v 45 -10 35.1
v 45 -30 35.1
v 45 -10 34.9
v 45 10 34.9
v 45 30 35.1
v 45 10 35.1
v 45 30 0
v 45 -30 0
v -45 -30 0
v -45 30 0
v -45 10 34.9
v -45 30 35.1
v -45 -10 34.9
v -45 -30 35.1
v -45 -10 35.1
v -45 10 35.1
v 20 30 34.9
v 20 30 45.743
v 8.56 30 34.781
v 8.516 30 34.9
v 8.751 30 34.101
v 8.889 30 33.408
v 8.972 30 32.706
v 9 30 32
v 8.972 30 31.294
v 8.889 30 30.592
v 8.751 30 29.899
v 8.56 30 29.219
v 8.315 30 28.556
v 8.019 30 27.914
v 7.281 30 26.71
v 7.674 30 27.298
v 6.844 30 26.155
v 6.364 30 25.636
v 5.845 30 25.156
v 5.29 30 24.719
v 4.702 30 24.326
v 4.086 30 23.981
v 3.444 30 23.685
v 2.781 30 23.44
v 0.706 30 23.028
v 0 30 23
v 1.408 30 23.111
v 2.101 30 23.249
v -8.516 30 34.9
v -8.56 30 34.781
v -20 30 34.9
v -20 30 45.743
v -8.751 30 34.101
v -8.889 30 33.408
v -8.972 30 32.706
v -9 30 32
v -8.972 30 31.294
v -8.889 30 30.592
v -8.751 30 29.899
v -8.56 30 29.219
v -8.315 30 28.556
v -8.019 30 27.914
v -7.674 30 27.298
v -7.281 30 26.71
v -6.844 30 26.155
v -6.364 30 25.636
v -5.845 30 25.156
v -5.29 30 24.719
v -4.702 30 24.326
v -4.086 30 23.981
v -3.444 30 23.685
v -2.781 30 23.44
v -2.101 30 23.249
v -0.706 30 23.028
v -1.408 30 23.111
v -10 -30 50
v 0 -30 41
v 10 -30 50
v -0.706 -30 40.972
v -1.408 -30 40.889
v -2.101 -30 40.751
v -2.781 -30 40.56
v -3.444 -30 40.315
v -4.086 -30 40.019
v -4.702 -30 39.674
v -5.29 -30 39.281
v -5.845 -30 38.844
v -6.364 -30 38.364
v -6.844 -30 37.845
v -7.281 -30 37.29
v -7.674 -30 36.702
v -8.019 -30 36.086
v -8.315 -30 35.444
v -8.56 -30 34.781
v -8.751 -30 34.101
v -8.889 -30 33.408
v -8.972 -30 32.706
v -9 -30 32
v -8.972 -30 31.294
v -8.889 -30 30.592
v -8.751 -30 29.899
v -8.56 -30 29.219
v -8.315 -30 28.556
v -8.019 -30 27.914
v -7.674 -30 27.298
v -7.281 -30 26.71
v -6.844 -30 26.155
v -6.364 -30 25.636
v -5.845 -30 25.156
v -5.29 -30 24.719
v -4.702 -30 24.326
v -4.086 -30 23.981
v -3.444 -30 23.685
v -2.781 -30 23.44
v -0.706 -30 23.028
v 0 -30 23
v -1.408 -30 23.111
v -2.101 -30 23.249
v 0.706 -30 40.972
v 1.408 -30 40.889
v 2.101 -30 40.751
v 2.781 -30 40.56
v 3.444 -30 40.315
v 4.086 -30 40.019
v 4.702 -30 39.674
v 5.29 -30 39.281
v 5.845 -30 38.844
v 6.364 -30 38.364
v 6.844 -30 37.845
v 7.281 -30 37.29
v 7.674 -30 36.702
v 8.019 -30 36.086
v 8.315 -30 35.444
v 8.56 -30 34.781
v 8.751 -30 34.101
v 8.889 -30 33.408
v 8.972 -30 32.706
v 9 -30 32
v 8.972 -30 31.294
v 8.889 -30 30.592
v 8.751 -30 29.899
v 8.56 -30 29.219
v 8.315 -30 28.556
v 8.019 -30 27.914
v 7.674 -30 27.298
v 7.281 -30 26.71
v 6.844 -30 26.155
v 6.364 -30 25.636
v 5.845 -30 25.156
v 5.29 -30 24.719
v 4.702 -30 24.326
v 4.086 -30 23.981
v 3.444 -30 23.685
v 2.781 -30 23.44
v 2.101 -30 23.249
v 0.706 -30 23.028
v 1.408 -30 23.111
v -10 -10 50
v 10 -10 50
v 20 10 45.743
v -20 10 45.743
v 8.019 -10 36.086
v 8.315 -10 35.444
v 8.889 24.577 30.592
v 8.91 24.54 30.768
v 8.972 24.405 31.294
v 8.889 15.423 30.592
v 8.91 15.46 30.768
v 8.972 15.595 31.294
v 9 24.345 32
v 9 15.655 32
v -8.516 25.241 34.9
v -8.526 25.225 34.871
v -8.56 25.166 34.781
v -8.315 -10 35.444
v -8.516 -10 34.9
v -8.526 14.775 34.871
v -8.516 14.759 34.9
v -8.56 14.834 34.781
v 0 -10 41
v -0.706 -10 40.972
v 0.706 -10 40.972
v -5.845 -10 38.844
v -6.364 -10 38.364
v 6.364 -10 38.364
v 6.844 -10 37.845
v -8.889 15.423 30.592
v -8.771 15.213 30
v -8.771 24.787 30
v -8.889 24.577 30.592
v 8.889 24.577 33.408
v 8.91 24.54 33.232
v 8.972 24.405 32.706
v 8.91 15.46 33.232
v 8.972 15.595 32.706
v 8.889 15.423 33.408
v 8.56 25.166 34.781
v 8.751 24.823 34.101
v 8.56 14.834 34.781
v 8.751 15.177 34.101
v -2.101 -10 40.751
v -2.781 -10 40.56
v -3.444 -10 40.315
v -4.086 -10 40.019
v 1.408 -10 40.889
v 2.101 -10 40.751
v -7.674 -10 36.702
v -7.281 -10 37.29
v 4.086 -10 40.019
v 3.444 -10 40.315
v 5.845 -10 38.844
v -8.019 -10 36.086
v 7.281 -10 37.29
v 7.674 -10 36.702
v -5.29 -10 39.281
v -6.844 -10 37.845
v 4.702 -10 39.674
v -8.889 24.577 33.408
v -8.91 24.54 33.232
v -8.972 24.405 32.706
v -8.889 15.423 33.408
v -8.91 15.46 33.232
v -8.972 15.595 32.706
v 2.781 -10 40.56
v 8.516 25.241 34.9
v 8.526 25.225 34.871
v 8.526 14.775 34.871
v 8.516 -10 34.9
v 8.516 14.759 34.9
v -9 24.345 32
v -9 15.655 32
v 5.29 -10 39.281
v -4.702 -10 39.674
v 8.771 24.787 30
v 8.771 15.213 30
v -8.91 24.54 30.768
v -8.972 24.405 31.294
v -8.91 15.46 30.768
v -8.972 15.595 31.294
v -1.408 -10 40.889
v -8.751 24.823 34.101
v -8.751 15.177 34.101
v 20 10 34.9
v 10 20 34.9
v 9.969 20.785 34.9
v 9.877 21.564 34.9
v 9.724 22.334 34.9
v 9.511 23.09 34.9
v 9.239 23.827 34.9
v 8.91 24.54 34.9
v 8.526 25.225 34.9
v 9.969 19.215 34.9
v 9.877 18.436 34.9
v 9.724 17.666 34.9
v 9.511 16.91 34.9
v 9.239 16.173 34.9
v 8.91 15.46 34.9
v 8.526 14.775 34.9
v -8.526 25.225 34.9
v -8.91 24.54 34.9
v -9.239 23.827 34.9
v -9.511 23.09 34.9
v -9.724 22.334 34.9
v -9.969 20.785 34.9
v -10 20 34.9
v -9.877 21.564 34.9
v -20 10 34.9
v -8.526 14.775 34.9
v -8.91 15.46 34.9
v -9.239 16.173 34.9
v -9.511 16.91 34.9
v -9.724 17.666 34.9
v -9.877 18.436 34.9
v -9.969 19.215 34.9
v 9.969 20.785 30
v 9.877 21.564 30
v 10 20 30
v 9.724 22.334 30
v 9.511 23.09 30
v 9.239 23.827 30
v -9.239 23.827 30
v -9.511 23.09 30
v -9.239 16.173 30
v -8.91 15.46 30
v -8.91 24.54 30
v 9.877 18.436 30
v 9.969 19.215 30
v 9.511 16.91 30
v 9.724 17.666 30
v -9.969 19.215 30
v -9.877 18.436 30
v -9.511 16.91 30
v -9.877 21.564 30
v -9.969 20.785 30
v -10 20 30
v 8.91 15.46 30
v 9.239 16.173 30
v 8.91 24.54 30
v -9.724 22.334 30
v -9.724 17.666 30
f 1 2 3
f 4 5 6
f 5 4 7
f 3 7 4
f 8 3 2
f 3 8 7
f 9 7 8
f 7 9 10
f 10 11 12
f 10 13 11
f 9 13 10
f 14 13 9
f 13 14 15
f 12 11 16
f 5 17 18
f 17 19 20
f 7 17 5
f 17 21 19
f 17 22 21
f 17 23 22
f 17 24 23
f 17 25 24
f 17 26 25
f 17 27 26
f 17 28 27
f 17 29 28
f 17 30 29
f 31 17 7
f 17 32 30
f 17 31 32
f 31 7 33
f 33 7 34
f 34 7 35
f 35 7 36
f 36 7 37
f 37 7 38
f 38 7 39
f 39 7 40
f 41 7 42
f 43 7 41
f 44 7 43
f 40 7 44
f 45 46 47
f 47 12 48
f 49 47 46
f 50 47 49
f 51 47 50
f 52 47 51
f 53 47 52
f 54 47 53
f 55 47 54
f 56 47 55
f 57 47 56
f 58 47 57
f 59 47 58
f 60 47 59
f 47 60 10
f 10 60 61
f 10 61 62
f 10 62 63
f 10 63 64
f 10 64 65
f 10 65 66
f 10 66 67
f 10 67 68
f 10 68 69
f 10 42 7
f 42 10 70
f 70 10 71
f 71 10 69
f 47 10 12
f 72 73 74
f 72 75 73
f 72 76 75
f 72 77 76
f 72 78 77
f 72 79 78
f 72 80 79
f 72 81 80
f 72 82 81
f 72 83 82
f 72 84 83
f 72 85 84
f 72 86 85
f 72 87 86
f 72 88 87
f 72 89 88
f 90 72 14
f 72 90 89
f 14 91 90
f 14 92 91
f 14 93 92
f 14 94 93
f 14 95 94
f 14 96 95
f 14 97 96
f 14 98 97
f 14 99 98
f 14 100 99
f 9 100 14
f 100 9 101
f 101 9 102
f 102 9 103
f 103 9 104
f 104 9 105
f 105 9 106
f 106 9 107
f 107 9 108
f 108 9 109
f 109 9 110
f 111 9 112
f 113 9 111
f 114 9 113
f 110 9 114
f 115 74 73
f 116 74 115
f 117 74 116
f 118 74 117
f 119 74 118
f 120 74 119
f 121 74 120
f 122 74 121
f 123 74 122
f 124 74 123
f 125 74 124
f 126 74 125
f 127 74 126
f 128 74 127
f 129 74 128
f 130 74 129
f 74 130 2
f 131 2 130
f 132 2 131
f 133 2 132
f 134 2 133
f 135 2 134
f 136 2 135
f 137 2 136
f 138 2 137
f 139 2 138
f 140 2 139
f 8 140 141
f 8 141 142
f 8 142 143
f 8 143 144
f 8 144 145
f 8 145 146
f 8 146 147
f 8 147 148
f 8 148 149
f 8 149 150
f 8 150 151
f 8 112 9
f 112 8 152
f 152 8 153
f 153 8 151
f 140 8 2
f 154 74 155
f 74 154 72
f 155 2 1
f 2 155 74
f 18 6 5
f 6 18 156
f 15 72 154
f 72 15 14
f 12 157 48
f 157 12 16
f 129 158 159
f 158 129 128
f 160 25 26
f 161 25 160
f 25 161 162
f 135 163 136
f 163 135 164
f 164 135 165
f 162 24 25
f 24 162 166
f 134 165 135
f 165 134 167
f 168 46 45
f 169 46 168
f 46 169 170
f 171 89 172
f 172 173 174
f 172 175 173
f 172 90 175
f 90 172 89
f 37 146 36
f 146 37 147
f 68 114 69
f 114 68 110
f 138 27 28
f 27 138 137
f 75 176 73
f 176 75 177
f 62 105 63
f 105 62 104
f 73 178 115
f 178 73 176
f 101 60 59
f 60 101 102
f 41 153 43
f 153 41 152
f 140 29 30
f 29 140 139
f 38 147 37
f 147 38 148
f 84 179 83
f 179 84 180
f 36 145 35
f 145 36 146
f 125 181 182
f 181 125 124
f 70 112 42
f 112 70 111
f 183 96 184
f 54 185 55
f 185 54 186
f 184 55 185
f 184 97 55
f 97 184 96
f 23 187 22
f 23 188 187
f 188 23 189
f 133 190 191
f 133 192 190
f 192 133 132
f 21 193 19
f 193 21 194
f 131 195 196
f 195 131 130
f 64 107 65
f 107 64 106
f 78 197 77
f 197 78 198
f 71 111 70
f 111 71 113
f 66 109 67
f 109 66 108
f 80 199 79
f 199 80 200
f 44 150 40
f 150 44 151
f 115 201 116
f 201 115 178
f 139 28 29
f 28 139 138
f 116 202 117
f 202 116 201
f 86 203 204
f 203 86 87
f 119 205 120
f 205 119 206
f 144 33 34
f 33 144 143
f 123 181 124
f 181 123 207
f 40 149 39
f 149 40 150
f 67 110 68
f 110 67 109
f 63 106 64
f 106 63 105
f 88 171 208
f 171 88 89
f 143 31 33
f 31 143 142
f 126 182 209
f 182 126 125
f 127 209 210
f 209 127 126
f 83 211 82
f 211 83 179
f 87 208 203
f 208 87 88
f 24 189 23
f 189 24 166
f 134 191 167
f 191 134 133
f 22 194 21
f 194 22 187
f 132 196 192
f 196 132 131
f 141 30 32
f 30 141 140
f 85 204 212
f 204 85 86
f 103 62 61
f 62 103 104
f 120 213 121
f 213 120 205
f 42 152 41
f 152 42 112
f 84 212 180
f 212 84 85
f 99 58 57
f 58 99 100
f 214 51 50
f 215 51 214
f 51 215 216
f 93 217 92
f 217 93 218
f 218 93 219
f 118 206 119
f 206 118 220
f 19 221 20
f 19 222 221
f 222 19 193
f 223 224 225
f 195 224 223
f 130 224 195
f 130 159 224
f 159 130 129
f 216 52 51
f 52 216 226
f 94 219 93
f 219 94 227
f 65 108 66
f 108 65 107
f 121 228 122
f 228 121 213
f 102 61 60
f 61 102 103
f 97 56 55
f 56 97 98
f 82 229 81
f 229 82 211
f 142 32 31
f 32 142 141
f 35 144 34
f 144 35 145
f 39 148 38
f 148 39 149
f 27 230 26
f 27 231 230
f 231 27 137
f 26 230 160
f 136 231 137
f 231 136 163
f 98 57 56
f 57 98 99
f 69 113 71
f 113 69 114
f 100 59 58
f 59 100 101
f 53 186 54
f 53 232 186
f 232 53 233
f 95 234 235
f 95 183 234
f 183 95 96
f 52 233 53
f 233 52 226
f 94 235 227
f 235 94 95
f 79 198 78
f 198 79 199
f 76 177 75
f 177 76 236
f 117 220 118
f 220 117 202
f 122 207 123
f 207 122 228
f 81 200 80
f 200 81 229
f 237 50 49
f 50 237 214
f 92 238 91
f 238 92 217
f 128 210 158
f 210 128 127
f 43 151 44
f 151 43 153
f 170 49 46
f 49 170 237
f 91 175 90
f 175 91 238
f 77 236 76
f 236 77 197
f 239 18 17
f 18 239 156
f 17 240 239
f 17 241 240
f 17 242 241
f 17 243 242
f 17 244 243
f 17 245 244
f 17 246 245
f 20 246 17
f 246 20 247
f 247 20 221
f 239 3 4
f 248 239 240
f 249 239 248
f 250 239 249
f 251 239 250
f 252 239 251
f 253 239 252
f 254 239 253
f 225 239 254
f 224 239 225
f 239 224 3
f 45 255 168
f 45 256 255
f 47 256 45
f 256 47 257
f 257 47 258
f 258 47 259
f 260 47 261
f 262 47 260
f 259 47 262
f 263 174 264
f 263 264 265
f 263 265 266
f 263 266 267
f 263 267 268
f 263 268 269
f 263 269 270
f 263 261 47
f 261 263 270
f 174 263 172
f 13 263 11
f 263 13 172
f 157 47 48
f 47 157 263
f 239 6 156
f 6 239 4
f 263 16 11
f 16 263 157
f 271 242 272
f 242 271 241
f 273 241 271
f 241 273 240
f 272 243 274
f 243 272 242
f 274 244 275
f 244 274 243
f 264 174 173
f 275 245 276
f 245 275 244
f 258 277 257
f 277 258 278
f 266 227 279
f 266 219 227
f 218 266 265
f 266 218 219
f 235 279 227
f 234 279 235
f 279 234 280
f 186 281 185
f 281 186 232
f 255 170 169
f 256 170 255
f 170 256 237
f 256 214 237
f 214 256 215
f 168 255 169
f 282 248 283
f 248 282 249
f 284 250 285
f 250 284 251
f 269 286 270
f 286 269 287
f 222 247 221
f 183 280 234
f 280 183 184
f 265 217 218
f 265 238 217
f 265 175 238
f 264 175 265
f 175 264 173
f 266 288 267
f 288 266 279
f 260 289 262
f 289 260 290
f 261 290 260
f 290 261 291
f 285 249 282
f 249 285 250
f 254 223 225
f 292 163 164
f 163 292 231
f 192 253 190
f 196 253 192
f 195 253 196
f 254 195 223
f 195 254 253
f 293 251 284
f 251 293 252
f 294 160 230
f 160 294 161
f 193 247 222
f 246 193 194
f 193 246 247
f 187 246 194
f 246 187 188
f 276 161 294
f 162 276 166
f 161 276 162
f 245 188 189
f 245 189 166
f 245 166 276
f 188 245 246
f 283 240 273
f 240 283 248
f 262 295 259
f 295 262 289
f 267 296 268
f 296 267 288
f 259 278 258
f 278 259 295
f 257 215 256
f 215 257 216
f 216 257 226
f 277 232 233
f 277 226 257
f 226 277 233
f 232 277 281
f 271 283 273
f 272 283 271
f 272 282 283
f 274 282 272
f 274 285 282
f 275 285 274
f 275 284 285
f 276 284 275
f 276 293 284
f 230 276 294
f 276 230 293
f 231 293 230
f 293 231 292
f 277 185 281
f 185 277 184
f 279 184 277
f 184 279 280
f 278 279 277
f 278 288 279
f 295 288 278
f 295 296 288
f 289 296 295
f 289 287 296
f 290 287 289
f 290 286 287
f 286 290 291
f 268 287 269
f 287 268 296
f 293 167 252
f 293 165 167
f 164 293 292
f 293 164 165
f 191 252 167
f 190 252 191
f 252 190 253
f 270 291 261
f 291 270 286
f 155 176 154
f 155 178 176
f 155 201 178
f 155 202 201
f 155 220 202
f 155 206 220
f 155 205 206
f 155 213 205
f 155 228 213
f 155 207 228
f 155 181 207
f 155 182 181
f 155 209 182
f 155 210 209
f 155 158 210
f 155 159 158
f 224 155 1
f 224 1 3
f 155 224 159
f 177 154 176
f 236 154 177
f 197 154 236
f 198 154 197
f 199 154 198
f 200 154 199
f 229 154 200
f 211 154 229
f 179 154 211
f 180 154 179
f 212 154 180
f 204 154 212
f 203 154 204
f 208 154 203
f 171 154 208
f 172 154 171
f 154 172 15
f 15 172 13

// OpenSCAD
// =========================================================
// BAN VE KY THUAT CO KHI - KHOT CANH & LO TRUYEN
// Don vi do: millimeter (mm)
// =========================================================

$fn = 80; // Do min cho cac mat cong

// Thong so kich thuoc chinh
total_x = 90;
total_y = 60;
total_z = 50;
base_z  = 20;

module main_model() {
    difference() {
        // --- 1. KHOI TAO HINH DANG BEN NGOAI ---
        union() {
            // De duoi
            translate([-total_x/2, -total_y/2, 0])
                cube([total_x, total_y, base_z]);
            
            // Than tren khoi thang (Z: 20 -> 35)
            translate([-total_x/2, -total_y/2, base_z])
                cube([total_x, total_y, 15]);
                
            // Than tren khoi vat (Z: 35 -> 50) thu hep tu 90 xuong 20
            hull() {
                translate([-total_x/2, -total_y/2, 35])
                    cube([total_x, total_y, 0.1]);
                translate([-10, -total_y/2, total_z - 0.1])
                    cube([20, total_y, 0.1]);
            }
        }

        // --- 2. CAC CHI TIET KHOET / TRU ---
        // a. Lo tron ngang Phi 18mm
        translate([0, -(total_y/2 + 5), 32])
            rotate([-90, 0, 0])
            cylinder(d=18, h=total_y + 10);

        // b. Ranh cat vuong o khoi tren (Rong 40, Sau 20, Cao 16)
        translate([-20, 10, 34.9])
            cube([40, 21, 16]);

        // c. Lo tru khoet dung R10 (Phi 20) tren ranh
        translate([0, 20, 30])
            cylinder(r=10, h=25);

        // d. Ranh cat ngang theo truc Y (Rong 20, Cao 16)
        translate([-(total_x/2 + 5), -10, 34.9])
            cube([total_x + 10, 20, 16]);
    }
}

// Hien thi mo hinh
main_model();
